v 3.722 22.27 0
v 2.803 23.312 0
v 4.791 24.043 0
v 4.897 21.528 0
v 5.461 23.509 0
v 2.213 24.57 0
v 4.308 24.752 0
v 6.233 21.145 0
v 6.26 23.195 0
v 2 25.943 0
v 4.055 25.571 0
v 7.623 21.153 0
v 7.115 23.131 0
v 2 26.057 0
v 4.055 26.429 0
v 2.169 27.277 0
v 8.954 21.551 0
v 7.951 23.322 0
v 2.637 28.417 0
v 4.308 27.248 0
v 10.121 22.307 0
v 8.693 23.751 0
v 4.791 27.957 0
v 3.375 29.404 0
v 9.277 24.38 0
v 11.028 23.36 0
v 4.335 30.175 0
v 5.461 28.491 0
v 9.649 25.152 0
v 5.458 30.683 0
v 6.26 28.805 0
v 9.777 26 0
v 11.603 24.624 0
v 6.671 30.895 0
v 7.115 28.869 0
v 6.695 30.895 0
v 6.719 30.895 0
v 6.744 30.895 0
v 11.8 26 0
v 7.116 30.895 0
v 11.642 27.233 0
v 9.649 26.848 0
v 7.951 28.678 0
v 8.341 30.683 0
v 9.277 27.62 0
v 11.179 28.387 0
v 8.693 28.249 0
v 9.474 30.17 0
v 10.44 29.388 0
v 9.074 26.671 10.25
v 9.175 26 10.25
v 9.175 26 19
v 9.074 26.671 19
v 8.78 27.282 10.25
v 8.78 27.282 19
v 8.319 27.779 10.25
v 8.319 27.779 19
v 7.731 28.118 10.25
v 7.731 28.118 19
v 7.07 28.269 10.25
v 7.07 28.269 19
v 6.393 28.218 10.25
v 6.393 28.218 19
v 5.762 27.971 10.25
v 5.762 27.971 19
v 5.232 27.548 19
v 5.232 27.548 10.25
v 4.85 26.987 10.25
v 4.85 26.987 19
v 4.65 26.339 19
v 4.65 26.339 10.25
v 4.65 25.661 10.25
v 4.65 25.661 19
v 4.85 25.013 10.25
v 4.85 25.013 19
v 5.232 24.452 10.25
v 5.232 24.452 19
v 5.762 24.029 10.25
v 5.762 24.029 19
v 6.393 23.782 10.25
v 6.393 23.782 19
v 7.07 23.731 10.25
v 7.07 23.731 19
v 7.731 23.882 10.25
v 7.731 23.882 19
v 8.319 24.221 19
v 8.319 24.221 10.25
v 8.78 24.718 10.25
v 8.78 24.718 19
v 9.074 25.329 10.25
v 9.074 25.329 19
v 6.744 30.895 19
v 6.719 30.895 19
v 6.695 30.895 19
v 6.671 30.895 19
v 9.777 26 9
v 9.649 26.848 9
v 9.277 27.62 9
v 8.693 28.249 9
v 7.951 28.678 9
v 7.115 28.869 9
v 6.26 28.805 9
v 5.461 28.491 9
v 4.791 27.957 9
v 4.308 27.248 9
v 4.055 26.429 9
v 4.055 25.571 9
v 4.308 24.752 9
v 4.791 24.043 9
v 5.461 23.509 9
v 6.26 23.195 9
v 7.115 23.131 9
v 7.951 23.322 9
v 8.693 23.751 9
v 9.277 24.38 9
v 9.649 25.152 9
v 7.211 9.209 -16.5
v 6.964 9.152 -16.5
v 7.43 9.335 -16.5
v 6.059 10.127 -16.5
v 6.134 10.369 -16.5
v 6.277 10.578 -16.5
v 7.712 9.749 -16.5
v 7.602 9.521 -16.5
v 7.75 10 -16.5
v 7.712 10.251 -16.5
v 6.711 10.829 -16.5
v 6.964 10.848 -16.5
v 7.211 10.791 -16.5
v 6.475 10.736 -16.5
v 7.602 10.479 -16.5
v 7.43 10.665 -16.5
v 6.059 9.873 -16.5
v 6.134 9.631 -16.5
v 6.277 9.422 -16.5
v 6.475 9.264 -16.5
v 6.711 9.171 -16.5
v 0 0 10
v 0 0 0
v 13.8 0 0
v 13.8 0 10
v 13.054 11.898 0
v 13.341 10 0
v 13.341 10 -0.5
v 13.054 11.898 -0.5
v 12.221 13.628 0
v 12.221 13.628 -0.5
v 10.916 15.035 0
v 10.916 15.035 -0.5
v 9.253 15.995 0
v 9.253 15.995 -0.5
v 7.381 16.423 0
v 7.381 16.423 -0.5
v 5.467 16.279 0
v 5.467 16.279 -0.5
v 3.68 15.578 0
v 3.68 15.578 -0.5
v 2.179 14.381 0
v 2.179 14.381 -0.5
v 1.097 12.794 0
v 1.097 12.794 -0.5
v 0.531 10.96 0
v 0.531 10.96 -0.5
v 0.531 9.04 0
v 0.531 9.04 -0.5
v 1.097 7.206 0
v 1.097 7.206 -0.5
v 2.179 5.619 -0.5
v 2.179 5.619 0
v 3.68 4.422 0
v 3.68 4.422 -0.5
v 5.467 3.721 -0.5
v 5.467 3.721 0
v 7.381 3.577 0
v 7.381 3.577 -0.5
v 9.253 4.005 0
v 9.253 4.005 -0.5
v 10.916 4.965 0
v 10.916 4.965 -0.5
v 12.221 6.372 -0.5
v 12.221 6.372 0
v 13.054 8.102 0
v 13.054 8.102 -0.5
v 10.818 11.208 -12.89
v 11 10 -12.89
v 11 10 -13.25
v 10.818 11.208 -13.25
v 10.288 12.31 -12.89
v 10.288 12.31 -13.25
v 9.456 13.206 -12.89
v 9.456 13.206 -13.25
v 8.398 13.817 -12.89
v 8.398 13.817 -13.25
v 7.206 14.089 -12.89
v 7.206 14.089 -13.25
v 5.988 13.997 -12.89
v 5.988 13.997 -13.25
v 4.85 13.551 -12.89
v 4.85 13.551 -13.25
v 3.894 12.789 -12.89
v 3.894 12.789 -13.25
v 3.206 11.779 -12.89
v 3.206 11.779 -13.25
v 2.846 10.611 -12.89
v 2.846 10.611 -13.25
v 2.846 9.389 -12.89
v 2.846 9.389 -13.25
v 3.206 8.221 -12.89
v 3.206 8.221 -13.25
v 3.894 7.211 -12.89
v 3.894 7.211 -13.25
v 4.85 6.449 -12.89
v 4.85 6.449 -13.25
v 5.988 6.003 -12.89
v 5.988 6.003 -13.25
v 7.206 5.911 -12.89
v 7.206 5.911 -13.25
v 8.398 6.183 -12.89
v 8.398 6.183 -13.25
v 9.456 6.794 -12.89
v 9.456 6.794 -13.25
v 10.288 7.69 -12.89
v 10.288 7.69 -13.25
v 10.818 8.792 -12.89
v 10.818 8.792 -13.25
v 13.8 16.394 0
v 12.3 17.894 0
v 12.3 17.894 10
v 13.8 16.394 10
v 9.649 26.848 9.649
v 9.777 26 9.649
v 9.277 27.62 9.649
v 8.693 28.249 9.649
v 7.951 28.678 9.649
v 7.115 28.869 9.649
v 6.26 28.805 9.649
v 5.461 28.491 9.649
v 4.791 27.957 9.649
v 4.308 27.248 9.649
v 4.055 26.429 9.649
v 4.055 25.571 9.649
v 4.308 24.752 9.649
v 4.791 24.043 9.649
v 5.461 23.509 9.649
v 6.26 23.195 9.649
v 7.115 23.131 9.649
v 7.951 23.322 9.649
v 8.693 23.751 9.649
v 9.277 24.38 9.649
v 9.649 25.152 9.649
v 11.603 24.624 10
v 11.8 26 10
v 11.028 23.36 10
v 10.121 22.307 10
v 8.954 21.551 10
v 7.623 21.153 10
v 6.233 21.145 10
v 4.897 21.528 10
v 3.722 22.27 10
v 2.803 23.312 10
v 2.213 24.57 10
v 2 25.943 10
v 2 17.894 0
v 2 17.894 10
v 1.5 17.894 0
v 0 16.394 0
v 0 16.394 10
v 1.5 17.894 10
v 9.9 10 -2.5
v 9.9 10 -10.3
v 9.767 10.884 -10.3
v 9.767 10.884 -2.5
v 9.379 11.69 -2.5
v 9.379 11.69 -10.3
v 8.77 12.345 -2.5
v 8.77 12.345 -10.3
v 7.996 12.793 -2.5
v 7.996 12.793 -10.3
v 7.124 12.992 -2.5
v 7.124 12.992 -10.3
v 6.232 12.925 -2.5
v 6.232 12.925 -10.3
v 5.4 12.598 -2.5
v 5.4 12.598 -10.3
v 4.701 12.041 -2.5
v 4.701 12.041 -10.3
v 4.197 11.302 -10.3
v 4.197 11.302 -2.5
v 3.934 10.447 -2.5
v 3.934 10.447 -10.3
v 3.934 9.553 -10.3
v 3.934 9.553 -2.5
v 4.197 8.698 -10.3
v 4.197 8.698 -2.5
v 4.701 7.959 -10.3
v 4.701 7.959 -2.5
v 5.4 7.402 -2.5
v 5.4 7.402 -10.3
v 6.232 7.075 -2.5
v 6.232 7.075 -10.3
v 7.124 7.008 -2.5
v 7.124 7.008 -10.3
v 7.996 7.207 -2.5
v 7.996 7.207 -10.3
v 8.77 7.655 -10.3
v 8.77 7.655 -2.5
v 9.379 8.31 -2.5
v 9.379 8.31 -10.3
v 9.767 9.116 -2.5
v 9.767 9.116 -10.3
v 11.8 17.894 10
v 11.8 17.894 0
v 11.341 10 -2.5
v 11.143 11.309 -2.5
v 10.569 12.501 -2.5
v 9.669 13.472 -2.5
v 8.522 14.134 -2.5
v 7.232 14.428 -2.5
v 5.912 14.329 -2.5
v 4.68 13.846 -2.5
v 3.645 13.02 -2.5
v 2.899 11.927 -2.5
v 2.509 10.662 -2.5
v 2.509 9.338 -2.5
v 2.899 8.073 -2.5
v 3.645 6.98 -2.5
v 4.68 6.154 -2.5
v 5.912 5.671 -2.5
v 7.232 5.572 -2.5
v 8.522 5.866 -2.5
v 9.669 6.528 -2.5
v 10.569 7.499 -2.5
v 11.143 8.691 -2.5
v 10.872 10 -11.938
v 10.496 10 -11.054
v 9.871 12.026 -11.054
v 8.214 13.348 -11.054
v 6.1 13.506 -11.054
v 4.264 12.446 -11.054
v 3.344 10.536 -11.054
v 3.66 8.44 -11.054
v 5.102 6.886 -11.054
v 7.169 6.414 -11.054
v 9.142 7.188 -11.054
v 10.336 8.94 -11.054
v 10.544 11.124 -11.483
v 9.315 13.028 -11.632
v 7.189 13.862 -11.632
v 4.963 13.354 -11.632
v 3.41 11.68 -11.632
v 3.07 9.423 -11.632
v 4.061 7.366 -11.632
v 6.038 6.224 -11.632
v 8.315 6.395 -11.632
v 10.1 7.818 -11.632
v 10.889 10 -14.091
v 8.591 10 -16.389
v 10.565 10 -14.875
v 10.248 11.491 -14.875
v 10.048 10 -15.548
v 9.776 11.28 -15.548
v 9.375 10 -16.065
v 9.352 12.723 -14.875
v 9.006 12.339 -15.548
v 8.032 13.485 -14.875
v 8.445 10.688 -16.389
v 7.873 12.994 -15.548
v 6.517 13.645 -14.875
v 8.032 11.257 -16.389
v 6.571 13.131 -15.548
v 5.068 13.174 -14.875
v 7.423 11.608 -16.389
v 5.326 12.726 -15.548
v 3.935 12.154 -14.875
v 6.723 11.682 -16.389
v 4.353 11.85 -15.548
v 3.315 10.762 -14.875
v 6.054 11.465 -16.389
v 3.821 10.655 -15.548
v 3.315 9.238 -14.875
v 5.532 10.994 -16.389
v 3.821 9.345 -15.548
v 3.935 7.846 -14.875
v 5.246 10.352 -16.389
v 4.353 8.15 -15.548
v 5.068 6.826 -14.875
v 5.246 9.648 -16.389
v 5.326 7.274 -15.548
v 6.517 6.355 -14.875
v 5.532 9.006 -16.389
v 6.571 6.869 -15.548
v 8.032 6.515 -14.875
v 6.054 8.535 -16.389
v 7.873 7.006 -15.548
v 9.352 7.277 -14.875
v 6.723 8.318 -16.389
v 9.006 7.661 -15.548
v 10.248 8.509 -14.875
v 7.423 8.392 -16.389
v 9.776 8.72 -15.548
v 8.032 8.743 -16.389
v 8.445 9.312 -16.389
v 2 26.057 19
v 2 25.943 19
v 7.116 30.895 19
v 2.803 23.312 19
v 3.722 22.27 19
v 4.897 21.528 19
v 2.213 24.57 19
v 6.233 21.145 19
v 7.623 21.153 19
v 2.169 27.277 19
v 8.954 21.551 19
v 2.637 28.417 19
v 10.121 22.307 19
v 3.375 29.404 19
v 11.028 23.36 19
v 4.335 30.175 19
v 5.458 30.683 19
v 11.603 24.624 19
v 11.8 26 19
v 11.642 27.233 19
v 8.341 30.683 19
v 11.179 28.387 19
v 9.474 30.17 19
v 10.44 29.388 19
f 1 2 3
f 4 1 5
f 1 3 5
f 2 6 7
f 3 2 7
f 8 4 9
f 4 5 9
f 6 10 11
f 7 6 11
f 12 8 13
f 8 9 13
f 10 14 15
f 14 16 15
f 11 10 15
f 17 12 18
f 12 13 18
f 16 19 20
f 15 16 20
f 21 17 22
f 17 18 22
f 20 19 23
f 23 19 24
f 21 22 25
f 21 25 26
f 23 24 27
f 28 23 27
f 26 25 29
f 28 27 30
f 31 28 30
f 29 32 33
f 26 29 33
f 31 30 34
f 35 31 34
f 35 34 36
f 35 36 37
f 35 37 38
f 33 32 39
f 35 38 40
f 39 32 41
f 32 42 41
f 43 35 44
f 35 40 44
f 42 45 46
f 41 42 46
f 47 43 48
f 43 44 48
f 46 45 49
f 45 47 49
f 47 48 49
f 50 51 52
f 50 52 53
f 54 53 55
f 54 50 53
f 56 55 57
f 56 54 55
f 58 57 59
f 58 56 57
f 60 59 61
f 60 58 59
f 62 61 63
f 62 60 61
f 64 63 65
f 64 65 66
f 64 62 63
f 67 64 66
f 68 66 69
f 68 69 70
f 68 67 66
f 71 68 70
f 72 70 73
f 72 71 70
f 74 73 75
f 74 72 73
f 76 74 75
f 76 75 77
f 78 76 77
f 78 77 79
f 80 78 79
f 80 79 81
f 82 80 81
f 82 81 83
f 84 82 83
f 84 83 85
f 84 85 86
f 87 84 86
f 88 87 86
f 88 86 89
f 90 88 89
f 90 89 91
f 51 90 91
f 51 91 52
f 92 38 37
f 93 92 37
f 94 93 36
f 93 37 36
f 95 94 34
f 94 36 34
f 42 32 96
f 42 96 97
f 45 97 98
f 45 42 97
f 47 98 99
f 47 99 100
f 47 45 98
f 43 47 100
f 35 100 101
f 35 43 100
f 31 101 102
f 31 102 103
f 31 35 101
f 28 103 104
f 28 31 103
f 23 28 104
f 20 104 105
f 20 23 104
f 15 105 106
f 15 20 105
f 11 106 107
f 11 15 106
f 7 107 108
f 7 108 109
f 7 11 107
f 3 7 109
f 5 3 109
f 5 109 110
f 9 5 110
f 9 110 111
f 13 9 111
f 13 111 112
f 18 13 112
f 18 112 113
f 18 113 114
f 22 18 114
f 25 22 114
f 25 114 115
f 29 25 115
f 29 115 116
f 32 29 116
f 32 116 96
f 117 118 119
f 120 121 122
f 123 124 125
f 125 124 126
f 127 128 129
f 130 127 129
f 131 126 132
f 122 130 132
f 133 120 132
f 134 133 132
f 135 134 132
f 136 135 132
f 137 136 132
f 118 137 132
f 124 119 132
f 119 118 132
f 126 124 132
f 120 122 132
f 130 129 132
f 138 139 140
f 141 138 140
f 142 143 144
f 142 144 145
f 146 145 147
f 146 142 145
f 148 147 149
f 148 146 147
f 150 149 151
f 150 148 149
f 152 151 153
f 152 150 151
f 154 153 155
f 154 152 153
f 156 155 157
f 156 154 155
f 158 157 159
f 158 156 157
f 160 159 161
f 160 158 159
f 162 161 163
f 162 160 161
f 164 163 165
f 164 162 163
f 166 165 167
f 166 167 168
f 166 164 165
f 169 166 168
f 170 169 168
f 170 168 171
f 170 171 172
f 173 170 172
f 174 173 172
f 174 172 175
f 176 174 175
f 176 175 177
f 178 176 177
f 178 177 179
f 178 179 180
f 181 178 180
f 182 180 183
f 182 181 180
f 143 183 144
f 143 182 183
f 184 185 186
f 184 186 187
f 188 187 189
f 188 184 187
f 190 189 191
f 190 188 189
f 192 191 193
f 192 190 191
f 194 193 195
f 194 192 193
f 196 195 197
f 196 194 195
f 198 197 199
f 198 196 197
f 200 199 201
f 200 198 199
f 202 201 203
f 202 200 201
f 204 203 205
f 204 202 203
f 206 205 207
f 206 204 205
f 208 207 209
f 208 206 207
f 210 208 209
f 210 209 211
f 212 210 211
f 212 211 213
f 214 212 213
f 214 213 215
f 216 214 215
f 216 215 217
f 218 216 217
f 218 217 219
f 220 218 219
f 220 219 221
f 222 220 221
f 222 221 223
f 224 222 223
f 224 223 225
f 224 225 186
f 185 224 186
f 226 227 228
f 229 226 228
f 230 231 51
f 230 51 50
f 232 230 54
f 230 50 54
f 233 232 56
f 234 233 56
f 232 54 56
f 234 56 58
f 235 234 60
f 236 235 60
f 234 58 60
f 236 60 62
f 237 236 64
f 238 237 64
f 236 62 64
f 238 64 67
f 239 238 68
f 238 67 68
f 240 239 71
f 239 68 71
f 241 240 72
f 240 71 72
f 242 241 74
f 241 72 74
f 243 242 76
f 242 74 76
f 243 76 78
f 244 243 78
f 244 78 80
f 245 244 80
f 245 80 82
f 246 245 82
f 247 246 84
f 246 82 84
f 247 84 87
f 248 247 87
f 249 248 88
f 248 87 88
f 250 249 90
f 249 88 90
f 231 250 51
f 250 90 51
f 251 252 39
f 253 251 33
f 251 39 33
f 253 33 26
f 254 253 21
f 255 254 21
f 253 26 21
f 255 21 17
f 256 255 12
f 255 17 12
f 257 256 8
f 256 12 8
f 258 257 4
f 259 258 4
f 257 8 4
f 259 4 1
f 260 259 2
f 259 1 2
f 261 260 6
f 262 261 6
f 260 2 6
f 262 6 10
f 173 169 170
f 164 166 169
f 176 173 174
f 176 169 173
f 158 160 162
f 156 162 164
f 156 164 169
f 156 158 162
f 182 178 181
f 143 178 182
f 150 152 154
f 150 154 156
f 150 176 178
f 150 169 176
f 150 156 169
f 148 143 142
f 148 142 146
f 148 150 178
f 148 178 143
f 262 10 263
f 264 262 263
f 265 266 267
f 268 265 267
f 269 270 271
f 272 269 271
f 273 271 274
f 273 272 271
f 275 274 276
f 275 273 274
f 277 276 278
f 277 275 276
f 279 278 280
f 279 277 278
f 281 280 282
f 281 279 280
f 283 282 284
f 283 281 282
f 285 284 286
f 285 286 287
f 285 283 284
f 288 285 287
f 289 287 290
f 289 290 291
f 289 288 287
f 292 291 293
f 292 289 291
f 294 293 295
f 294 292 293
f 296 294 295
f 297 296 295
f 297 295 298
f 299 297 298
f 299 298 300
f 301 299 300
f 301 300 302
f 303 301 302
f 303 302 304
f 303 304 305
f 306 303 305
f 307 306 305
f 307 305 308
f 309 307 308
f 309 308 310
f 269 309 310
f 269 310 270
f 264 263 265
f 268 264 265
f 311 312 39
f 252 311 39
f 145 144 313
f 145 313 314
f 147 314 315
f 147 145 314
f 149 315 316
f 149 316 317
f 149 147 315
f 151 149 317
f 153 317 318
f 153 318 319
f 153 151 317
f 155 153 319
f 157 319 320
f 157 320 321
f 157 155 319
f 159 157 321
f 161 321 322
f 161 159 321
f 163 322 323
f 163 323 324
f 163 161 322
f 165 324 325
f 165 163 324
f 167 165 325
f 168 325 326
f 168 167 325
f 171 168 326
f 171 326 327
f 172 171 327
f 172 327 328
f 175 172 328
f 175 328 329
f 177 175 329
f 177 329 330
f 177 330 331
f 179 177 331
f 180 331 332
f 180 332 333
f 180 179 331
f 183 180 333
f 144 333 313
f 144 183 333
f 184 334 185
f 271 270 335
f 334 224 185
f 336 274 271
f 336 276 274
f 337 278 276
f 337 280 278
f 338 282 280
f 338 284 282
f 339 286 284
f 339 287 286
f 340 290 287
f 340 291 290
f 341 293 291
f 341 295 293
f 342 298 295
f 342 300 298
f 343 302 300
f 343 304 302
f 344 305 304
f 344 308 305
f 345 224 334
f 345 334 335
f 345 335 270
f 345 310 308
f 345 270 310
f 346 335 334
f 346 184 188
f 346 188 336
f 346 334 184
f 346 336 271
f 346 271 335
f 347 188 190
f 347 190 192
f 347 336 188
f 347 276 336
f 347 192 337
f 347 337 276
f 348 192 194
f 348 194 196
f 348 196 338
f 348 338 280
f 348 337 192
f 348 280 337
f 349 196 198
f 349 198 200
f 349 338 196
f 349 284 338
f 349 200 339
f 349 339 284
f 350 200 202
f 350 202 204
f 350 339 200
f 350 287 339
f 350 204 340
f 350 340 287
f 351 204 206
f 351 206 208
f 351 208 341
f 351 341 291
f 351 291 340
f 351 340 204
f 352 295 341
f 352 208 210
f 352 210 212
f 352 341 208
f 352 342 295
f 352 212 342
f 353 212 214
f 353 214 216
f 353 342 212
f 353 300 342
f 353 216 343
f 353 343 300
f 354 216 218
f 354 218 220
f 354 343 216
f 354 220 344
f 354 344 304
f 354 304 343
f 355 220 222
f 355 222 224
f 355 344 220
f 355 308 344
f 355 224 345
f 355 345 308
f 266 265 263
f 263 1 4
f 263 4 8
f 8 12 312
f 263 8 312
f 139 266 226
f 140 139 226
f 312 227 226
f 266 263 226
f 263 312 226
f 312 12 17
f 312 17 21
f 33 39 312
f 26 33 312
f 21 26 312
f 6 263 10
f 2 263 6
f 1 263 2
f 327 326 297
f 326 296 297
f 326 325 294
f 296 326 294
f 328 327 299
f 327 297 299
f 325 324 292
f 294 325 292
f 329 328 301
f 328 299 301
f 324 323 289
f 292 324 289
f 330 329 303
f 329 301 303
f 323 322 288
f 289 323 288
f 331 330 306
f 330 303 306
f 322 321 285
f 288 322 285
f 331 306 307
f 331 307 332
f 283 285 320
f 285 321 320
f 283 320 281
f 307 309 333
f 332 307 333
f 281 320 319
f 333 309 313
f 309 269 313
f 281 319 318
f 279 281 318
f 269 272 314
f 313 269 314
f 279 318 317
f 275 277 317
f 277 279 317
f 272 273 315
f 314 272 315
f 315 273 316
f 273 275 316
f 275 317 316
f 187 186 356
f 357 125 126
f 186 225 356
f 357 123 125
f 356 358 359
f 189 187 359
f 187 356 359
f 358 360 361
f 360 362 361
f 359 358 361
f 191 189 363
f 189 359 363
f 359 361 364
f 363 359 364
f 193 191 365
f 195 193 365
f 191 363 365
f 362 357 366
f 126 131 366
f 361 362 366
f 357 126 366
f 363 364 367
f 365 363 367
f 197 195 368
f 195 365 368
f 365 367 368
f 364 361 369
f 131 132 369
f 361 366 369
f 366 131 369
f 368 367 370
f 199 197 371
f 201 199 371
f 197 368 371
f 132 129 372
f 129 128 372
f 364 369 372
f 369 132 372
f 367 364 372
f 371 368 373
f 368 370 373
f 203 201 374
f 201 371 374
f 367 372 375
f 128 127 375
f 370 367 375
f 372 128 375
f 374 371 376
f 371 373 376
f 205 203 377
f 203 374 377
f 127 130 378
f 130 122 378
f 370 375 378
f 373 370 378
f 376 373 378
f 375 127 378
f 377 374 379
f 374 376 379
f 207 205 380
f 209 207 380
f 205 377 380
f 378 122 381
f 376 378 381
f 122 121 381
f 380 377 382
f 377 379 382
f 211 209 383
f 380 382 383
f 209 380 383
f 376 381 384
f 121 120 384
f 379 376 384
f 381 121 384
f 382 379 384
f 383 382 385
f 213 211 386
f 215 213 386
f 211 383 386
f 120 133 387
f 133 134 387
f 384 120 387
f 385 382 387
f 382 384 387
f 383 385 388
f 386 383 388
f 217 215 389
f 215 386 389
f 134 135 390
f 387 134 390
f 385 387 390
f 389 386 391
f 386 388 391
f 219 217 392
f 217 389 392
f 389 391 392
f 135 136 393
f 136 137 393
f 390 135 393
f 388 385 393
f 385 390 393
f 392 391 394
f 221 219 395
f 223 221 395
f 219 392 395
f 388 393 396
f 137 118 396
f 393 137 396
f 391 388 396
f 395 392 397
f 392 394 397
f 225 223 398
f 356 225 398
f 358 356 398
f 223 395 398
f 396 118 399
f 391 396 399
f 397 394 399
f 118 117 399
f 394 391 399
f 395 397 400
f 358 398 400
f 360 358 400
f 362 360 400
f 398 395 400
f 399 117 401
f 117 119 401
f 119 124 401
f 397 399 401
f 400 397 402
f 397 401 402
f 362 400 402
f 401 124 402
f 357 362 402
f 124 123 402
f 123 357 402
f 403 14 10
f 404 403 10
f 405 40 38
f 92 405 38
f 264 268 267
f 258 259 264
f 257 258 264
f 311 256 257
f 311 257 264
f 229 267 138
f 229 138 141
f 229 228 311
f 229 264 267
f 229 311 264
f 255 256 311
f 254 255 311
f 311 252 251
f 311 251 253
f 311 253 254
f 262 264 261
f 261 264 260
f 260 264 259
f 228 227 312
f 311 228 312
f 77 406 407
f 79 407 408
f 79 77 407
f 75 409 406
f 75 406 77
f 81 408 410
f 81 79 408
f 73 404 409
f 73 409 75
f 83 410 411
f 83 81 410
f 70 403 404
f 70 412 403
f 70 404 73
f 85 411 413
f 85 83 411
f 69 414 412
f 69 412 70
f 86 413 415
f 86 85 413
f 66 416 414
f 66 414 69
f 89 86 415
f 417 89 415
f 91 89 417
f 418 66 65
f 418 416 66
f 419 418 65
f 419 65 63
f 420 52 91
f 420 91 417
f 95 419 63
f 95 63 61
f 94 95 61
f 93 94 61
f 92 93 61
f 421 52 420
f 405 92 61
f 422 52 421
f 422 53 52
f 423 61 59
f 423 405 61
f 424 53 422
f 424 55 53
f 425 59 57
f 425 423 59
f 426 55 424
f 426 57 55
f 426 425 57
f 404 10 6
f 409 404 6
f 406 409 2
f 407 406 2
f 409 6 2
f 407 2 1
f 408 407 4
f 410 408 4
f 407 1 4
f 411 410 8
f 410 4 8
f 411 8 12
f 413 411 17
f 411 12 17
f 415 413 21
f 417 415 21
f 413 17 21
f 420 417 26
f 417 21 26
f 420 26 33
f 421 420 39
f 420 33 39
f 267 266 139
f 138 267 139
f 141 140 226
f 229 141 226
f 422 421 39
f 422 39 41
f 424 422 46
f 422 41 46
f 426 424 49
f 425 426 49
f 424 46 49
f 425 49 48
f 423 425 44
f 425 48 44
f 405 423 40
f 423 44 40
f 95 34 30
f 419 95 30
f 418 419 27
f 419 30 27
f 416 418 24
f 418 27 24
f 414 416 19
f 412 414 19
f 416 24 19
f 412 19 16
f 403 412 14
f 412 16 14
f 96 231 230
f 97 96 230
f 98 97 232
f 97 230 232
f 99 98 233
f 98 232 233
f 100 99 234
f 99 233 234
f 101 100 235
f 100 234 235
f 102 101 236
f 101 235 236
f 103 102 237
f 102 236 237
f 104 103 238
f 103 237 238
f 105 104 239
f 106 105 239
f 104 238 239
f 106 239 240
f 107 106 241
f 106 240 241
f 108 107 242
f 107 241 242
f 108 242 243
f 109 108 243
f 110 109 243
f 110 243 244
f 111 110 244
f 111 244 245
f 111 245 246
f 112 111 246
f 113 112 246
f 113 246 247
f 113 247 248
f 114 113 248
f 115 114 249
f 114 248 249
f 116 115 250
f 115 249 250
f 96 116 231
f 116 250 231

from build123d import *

# Parameters (mm, degrees)
F0_R         = 2.8766712164
F1_DEPTH     = 19
F0_R_2       = 3
F2_DEPTH     = 16.5
F3_START     = -10.3
F0_R_3       = 4.1
F3_DEPTH     = 6.2
F0_R_4       = 6.4405757452
F4_DEPTH     = 2.5
F5_DEPTH     = 10
F6_R         = 3.25
F8_SIZE      = 2
F9_START     = 9
F0_R_5       = 2.2754716525
F9_DEPTH     = 10
F10_S5_R     = 2.8766712164
F10_T6_DEPTH = 7
F11_SIZE     = 1.5


# Not quite as in the source:
# - a fillet or chamfer that OpenCascade refuses, or shapes differently, is made with other operations: its cross-section is extruded or revolved along the edge and cut away or added


with BuildPart() as f1:
    # F0 (on Top) → F1 (new body)
    with BuildSketch(Plane.XY):
        with BuildLine():
            Line((2, 26.0571271565), (2, 25.9428728435))
            ThreePointArc((2, 25.9428728435), (6.9283975578, 21.0999167478), (11.8, 26))
            ThreePointArc((11.8, 26), (10.4404727363, 29.3875515556), (7.1162793435, 30.8953838438))
            Line((7.1162793435, 30.8953838438), (6.7435880271, 30.8953838438))
            ThreePointArc((6.7435880271, 30.8953838438), (6.7074201677, 30.8952459595), (6.6712544109, 30.8948323144))
            ThreePointArc((6.6712544109, 30.8948323144), (3.3747800634, 29.4037670445), (2, 26.0571271565))
        make_face()
        with Locations((6.8998334943, 26)):
            Circle(F0_R, mode=Mode.SUBTRACT)
    extrude(amount=F1_DEPTH)

    # F0 (on Top) → F9 (join)
    with BuildSketch(Plane.XY.offset(F9_START)):
        with Locations((6.8998334943, 26)):
            Circle(F0_R)
        with Locations((6.8998334943, 26)):
            Circle(F0_R_5, mode=Mode.SUBTRACT)
    extrude(amount=F9_DEPTH)

    # F10: chamfer of 1.25 on 1 edges, made by hand


with BuildPart() as f2:
    # F0 (on Top) → F2 (new body)
    with BuildSketch(Plane.XY):
        with Locations((6.9, 10)):
            Circle(F0_R_2)
    extrude(amount=-F2_DEPTH)

    # F0 (on Top) → F3 (join)
    with BuildSketch(Plane.XY.offset(F3_START)):
        with Locations((6.9, 10)):
            Circle(F0_R_3)
        with Locations((6.9, 10)):
            Circle(F0_R_2, mode=Mode.SUBTRACT)
    extrude(amount=-F3_DEPTH)

    # F0 (on Top) → F4 (join)
    with BuildSketch(Plane.XY):
        with Locations((6.9, 10)):
            Circle(F0_R_4)
        with Locations((6.9, 10)):
            Circle(F0_R_3, mode=Mode.SUBTRACT)
        with Locations((6.9, 10)):
            Circle(F0_R_3)
        with Locations((6.9, 10)):
            Circle(F0_R_2, mode=Mode.SUBTRACT)
    extrude(amount=-F4_DEPTH)

    # F6
    f6_edges = [f2.edges().sort_by_distance(p)[0] for p in [
        (2.8, 10, -16.5),
    ]]
    fillet(f6_edges, radius=F6_R)

    # F7: fillet of radius 3.6 on 1 edges, made by hand

    # F7_s1 → F7_t2 (revolve, cut)
    with BuildSketch(Plane.XZ.offset(-10)):
        with BuildLine():
            ThreePointArc((11, -12.8903667694), (10.7136083052, -11.4832420415), (9.9, -10.3))
            Line((9.9, -10.3), (11, -10.3))
            Line((11, -10.3), (11, -12.8903667694))
        make_face()
    revolve(axis=Axis((6.9, 10, -10.3), (0, 0, 1)), mode=Mode.SUBTRACT)

    # F8
    f8_edges = [f2.edges().sort_by_distance(p)[0] for p in [
        (0.459424, 10, -2.5),
    ]]
    chamfer(f8_edges, length=F8_SIZE)


with BuildPart() as f5:
    # F0 (on Top) → F5 (new body)
    with BuildSketch(Plane.XY):
        with BuildLine():
            Line((2, 25.9428728435), (2, 17.8943023658))
            Line((2, 17.8943023658), (11.8, 17.8943023658))
            Line((11.8, 17.8943023658), (11.8, 26))
            ThreePointArc((11.8, 26), (6.9283975578, 21.0999167478), (2, 25.9428728435))
        make_face()
        Polygon((0, 17.8943023658), (0, 0), (13.8, 0), (13.8, 17.8943023658), (11.8, 17.8943023658), (2, 17.8943023658), align=None)
        with Locations((6.9, 10)):
            Circle(F0_R_4, mode=Mode.SUBTRACT)
        with Locations((6.9, 10)):
            Circle(F0_R_4)
        with Locations((6.9, 10)):
            Circle(F0_R_3, mode=Mode.SUBTRACT)
        with Locations((6.9, 10)):
            Circle(F0_R_3)
        with Locations((6.9, 10)):
            Circle(F0_R_2, mode=Mode.SUBTRACT)
        with Locations((6.9, 10)):
            Circle(F0_R_2)
    extrude(amount=F5_DEPTH)

    # F11
    f11_edges = [f5.edges().sort_by_distance(p)[0] for p in [
        (0, 17.894302, 5),
        (13.8, 17.894302, 5),
    ]]
    chamfer(f11_edges, length=F11_SIZE)


with BuildPart() as f10_tool2:
    # F10_s3 → F10_t4 (revolve)
    with BuildSketch(Plane.XZ.offset(-26)):
        Polygon((10.4253051468, 9), (9.1753051468, 10.25), (9.1753051468, 9), align=None)
    revolve(axis=Axis((6.8998334943, 26, 9), (0, 0, 1)))

    # F10_s5 → F10_t6 (intersect, symmetric)
    with BuildSketch(Plane.XY.offset(9.6)):
        with Locations((6.8998334943, 26)):
            Circle(F10_S5_R)
    extrude(amount=F10_T6_DEPTH, both=True, mode=Mode.INTERSECT)


with BuildPart() as f1_1:
    add(f1.part)

    # F10_t1: cut F10_tool2
    add(f10_tool2.part, mode=Mode.SUBTRACT)


solid = Compound([f2.part, f5.part, f1_1.part])
